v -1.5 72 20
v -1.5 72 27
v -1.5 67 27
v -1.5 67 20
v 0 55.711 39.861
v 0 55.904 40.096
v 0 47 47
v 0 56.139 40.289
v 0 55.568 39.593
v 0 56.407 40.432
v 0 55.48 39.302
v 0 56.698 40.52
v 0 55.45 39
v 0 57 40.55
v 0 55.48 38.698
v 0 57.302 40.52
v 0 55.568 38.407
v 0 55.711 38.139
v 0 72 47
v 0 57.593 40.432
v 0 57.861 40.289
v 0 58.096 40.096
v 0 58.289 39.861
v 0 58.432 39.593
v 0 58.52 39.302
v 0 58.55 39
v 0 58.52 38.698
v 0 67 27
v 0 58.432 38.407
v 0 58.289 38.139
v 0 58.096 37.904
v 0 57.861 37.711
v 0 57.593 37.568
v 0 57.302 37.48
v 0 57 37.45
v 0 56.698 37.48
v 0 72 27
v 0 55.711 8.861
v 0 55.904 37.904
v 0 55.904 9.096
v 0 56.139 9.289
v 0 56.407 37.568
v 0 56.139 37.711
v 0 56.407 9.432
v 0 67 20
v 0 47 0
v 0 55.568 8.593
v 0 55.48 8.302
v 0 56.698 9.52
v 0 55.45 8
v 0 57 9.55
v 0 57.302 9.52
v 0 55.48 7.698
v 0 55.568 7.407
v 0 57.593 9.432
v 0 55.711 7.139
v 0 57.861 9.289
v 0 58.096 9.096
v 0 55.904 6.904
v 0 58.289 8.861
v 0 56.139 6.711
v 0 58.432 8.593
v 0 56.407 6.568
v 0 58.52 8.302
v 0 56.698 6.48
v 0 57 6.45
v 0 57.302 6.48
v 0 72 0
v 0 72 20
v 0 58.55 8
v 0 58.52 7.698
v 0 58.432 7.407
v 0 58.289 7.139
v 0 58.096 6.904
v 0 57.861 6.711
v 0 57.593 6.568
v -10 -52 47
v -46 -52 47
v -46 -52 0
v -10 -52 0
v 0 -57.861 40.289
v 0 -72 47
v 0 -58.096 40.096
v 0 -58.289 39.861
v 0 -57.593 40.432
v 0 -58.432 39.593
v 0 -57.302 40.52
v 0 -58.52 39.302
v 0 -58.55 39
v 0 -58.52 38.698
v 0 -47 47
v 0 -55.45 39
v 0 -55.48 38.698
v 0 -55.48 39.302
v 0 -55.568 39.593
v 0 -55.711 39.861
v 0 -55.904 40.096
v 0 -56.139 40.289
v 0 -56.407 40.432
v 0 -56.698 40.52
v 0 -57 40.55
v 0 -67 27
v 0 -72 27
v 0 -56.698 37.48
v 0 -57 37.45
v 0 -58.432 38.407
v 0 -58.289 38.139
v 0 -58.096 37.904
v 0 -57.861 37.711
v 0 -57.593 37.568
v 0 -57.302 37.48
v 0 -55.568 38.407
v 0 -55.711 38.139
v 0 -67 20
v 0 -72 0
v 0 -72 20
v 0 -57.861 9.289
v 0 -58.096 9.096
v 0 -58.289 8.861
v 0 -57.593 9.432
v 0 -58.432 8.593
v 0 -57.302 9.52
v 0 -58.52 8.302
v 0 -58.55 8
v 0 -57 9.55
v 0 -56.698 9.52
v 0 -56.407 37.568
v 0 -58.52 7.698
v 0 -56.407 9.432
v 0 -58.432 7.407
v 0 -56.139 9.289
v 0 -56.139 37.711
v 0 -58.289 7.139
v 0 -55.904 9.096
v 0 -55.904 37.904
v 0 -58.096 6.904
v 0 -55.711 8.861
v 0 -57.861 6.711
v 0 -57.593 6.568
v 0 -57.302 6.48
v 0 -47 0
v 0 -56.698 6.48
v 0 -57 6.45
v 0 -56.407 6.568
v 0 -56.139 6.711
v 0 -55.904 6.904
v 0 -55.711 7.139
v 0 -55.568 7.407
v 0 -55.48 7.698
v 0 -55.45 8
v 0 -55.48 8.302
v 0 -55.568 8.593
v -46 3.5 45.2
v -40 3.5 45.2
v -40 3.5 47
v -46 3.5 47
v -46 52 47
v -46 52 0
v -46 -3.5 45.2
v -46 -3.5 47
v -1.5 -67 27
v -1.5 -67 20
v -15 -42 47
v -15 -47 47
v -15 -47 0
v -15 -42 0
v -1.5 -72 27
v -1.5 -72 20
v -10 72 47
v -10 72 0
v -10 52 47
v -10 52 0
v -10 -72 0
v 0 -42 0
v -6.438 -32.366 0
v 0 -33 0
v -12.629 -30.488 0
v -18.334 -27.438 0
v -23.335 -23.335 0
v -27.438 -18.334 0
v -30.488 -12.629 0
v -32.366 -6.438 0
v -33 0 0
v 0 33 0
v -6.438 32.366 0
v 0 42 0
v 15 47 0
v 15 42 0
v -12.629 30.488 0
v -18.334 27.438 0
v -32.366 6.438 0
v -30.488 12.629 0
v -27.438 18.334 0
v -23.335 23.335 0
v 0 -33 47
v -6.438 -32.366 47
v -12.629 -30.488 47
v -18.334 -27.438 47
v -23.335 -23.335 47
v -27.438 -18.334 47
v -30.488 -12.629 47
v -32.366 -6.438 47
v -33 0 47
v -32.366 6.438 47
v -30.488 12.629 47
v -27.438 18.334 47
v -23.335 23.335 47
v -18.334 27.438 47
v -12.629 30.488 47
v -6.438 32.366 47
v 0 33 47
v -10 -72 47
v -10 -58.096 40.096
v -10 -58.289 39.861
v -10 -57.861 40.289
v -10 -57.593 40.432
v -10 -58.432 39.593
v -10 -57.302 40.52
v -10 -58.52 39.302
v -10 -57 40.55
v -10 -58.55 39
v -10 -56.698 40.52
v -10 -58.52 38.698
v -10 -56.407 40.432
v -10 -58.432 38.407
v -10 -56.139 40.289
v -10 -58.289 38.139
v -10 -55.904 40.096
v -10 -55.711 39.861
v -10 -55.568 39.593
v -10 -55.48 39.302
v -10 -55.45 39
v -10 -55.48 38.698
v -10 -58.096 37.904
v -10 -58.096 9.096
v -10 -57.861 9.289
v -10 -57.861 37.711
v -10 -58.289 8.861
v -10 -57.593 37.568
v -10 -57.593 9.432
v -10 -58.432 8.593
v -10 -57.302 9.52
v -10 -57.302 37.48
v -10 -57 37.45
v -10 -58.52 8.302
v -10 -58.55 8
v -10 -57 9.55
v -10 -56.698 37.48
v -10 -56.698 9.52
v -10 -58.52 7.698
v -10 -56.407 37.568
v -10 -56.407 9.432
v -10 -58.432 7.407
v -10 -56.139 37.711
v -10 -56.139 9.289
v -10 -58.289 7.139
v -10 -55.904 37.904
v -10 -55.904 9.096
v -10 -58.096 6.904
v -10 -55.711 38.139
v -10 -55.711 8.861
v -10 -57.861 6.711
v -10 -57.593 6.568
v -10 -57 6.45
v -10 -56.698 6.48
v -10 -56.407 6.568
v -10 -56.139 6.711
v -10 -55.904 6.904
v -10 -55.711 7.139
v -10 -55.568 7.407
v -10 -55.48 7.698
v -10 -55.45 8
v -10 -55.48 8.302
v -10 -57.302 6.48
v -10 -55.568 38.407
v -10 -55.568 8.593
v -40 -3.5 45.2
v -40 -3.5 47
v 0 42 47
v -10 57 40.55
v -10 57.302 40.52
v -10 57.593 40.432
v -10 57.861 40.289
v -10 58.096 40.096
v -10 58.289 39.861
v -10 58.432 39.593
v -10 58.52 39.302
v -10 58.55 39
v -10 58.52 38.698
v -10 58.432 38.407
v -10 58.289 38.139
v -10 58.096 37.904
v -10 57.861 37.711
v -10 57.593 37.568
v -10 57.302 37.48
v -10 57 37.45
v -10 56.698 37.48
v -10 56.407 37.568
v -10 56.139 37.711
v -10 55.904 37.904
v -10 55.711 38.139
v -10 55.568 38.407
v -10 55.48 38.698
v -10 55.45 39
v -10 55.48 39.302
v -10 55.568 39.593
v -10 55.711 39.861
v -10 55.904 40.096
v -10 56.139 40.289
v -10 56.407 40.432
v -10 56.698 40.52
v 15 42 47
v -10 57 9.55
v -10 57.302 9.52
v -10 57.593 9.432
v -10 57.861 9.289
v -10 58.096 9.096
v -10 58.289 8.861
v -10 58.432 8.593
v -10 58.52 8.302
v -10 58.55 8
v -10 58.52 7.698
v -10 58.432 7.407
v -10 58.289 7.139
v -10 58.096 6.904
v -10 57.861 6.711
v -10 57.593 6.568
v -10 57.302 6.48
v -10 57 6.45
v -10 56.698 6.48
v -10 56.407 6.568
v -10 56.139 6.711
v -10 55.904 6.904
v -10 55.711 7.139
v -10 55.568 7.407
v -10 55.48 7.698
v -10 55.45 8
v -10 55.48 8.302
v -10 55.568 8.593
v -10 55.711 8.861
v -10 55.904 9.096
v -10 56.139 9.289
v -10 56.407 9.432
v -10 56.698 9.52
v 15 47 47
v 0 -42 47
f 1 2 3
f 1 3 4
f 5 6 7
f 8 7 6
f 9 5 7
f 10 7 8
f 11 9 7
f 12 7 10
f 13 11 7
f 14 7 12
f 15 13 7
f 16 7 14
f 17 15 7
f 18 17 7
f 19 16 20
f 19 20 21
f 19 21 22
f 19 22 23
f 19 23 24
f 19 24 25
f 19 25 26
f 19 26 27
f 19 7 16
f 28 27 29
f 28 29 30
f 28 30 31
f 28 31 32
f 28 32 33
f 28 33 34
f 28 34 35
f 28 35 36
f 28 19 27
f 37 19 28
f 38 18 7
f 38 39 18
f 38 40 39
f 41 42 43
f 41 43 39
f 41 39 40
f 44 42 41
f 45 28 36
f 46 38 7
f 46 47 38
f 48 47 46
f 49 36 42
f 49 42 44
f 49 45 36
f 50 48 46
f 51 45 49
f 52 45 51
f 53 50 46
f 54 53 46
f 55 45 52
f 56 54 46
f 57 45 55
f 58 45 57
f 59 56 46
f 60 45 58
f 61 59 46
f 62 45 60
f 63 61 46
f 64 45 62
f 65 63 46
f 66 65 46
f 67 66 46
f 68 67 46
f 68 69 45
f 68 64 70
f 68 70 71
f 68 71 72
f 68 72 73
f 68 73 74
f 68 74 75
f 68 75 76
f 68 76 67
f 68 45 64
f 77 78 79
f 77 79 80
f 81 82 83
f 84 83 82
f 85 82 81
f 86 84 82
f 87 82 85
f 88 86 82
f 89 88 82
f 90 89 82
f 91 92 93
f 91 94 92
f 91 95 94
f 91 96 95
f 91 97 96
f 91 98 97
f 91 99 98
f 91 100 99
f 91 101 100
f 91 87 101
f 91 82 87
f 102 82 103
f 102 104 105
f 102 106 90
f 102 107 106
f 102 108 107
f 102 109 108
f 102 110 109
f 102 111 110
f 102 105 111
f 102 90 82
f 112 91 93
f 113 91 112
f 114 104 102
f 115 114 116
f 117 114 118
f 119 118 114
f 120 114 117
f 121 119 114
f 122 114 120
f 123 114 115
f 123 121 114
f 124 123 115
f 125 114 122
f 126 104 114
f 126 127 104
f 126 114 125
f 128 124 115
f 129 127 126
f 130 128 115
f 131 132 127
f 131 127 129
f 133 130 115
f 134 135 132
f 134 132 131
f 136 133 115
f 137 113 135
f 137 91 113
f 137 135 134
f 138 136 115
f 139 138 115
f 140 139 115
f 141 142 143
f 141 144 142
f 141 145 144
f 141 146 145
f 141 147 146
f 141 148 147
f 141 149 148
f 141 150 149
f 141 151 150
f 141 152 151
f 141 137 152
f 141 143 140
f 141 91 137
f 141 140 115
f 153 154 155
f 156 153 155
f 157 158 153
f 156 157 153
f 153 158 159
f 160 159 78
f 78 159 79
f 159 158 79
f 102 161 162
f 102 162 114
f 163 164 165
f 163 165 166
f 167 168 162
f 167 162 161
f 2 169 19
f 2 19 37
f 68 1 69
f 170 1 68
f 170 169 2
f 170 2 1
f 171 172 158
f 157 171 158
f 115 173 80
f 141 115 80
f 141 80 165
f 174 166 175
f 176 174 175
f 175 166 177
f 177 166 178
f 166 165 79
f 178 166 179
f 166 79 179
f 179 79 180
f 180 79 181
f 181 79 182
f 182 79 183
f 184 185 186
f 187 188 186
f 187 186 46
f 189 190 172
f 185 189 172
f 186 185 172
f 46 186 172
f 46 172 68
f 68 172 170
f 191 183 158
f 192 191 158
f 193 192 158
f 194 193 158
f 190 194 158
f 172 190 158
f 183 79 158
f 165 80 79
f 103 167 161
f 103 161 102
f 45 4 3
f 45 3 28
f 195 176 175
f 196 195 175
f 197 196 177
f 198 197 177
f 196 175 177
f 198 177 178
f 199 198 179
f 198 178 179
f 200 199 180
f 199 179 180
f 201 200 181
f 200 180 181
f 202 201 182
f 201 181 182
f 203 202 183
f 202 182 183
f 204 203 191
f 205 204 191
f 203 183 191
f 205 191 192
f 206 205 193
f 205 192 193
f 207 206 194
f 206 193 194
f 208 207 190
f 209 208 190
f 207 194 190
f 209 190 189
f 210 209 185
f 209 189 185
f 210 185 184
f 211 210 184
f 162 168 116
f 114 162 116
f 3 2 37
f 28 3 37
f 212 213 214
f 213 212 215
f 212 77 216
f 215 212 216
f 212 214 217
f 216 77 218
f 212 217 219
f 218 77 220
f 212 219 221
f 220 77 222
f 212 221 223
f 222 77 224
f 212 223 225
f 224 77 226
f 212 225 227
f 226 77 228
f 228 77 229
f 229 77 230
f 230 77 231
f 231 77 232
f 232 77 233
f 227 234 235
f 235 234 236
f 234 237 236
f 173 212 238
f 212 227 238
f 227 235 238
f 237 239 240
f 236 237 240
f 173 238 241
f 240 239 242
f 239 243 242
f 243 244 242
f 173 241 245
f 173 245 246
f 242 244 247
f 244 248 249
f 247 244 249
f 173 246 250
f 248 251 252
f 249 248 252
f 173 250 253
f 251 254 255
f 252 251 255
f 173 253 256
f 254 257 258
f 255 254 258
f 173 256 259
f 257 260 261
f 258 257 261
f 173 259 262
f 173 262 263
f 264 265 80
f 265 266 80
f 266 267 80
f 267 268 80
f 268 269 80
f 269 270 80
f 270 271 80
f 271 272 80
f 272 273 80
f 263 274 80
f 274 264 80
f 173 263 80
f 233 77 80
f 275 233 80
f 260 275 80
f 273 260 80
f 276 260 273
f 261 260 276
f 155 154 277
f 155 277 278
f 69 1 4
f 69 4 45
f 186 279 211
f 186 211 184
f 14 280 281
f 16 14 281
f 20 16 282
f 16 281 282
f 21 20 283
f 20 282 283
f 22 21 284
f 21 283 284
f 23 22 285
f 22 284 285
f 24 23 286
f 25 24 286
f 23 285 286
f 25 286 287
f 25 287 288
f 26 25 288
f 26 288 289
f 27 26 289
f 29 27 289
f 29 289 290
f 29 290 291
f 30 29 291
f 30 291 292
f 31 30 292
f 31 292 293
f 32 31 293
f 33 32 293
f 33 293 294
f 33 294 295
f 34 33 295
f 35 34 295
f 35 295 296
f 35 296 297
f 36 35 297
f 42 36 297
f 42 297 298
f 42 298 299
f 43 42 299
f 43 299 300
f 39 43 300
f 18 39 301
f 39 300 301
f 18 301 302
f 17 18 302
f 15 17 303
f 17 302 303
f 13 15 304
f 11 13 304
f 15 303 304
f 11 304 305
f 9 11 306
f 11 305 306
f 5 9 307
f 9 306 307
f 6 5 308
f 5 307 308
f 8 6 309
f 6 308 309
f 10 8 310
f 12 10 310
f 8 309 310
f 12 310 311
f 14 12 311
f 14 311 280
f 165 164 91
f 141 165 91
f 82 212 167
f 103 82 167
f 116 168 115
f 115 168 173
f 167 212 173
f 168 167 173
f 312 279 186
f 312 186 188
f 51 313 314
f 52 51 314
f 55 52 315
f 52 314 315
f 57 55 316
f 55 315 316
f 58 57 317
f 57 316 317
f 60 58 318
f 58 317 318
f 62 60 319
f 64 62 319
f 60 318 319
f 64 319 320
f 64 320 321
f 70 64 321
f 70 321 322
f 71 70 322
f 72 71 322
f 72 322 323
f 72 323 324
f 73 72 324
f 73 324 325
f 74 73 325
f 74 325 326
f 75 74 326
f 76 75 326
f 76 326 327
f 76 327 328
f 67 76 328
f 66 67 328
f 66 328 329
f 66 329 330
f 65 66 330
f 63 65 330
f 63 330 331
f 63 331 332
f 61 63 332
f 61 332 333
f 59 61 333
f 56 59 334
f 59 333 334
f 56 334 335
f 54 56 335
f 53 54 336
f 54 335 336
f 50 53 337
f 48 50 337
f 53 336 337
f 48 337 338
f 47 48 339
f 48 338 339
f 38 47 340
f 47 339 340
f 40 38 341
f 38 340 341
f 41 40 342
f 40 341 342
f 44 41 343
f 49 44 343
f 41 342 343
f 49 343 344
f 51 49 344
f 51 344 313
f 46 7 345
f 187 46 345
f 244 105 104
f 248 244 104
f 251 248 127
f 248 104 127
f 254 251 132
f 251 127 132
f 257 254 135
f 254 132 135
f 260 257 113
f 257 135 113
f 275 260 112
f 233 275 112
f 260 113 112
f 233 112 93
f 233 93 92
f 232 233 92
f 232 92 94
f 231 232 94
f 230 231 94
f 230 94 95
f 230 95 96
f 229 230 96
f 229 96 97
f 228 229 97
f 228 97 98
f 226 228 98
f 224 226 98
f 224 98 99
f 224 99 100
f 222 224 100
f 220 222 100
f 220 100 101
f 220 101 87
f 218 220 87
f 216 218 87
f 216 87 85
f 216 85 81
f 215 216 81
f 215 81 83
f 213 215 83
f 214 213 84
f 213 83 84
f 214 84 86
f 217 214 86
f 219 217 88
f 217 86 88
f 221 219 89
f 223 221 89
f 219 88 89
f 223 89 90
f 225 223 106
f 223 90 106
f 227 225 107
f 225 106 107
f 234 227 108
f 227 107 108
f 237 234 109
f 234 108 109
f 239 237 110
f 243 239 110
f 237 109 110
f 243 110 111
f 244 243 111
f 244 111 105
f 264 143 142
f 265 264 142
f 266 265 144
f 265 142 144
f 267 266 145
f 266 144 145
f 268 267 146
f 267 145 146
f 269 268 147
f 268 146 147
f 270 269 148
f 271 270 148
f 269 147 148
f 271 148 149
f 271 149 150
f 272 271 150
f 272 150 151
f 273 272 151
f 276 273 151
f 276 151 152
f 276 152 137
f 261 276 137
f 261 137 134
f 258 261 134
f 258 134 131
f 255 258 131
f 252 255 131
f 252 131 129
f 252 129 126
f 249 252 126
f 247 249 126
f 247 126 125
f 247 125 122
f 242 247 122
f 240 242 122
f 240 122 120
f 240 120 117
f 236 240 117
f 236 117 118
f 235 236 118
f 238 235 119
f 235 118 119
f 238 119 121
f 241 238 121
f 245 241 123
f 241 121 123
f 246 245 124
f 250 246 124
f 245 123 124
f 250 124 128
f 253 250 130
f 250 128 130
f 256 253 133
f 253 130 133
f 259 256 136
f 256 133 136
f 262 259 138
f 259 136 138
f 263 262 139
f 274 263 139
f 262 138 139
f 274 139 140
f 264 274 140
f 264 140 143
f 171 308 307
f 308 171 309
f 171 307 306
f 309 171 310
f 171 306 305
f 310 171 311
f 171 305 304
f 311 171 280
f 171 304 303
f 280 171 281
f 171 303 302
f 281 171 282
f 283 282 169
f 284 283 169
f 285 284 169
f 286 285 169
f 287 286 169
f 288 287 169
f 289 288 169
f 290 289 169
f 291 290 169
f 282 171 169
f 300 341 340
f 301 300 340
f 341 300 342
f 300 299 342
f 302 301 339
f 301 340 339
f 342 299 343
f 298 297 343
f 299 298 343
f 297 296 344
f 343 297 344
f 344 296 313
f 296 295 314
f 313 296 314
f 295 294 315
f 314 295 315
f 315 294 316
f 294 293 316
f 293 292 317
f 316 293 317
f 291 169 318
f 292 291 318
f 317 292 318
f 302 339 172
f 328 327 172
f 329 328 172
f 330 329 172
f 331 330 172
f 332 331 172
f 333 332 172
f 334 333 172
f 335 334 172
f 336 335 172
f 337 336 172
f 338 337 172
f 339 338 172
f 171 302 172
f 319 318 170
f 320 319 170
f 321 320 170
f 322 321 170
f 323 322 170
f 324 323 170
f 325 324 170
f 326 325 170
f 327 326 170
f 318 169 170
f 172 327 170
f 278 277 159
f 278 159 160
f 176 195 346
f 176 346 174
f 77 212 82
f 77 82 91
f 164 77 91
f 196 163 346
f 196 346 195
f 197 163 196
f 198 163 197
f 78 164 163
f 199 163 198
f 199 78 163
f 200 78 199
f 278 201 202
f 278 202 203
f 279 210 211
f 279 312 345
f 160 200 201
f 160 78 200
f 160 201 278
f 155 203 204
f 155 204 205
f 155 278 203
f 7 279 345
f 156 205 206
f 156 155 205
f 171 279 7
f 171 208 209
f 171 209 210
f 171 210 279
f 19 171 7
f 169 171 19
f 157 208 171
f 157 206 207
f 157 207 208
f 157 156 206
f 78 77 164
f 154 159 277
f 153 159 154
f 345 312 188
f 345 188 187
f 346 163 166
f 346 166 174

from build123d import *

# Parameters (mm, degrees)
EXTRUDE_1_DEPTH     = 47
SKETCH_2_W          = 47
SKETCH_2_H          = 20
EXTRUDE_2_DEPTH     = 10
SKETCH_5_W          = 47
SKETCH_5_H          = 20
EXTRUDE_5_DEPTH     = 10
SKETCH_6_W          = 15
SKETCH_6_H          = 5
CUT_EXTRUDE_1_DEPTH = 98.514101544
SKETCH_7_W          = 15
SKETCH_7_H          = 5
EXTRUDE_6_DEPTH     = 47
SKETCH_8_W          = 1.5
SKETCH_8_H          = 7
CUT_EXTRUDE_2_DEPTH = 5
SKETCH_10_R         = 1.55
CUT_EXTRUDE_4_DEPTH = 98.514101544
SKETCH_12_R         = 1.55
CUT_EXTRUDE_5_DEPTH = 94.214805691
SKETCH_13_W         = 1.5
SKETCH_13_H         = 7
CUT_EXTRUDE_6_DEPTH = 5
SKETCH_14_W         = 1.8
SKETCH_14_H         = 7
CUT_EXTRUDE_7_DEPTH = 6


with BuildPart() as part:
    # 草图1 → 凸台-拉伸1 (new body)
    with BuildSketch(Plane.XY):
        with BuildLine():
            Line((0, 33), (0, 52))
            Line((0, 52), (-46, 52))
            Line((-46, 52), (-46, -52))
            Line((-46, -52), (0, -52))
            Line((0, -52), (0, -33))
            ThreePointArc((0, -33), (-33, 0), (0, 33))
        make_face()
    extrude(amount=EXTRUDE_1_DEPTH)

    # 草图2 → 凸台-拉伸2 (add)
    with BuildSketch(Plane(origin=(-10, 0, 0), x_dir=(0, 0, -1), z_dir=(1, 0, 0))):
        with Locations((-23.5, 62)):
            Rectangle(SKETCH_2_W, SKETCH_2_H)
    extrude(amount=EXTRUDE_2_DEPTH)

    # 草图5 → 凸台-拉伸5 (add)
    with BuildSketch(Plane(origin=(-10, 0, 0), x_dir=(0, 0, -1), z_dir=(1, 0, 0))):
        with Locations((-23.5, -62)):
            Rectangle(SKETCH_5_W, SKETCH_5_H)
    extrude(amount=EXTRUDE_5_DEPTH)

    # 草图6 → 切除-拉伸1 (cut, through all)
    with BuildSketch(Plane.XY.offset(47)):
        with Locations((-7.5, -44.5)):
            Rectangle(SKETCH_6_W, SKETCH_6_H)
    extrude(amount=-CUT_EXTRUDE_1_DEPTH, mode=Mode.SUBTRACT)

    # 草图7 → 凸台-拉伸6 (add, through all)
    with BuildSketch(Plane.XY.offset(47)):
        with Locations((7.5, 44.5)):
            Rectangle(SKETCH_7_W, SKETCH_7_H)
    extrude(amount=-EXTRUDE_6_DEPTH)

    # 草图8 → 切除-拉伸2 (cut)
    with BuildSketch(Plane.XZ.offset(72)):
        with Locations((-0.75, 23.5)):
            Rectangle(SKETCH_8_W, SKETCH_8_H)
    extrude(amount=-CUT_EXTRUDE_2_DEPTH, mode=Mode.SUBTRACT)

    # 草图10 → 切除-拉伸4 (cut, through all)
    with BuildSketch(Plane(origin=(0, 0, 0), x_dir=(0, 0, -1), z_dir=(1, 0, 0))):
        with Locations((-39, -57)):
            Circle(SKETCH_10_R)
        with Locations((-8, -57)):
            Circle(SKETCH_10_R)
    extrude(amount=-CUT_EXTRUDE_4_DEPTH, mode=Mode.SUBTRACT)

    # 草图12 → 切除-拉伸5 (cut, through all)
    with BuildSketch(Plane.ZY.offset(10)):
        with Locations((8, 57)):
            Circle(SKETCH_12_R)
        with Locations((39, 57)):
            Circle(SKETCH_12_R)
    extrude(amount=-CUT_EXTRUDE_5_DEPTH, mode=Mode.SUBTRACT)

    # 草图13 → 切除-拉伸6 (cut)
    with BuildSketch(Plane(origin=(0, 72, 0), x_dir=(1, 0, 0), z_dir=(0, 1, 0))):
        with Locations((-0.75, -23.5)):
            Rectangle(SKETCH_13_W, SKETCH_13_H)
    extrude(amount=-CUT_EXTRUDE_6_DEPTH, mode=Mode.SUBTRACT)

    # 草图14 → 切除-拉伸7 (cut)
    with BuildSketch(Plane.ZY.offset(46)):
        with Locations((46.1, 0)):
            Rectangle(SKETCH_14_W, SKETCH_14_H)
    extrude(amount=-CUT_EXTRUDE_7_DEPTH, mode=Mode.SUBTRACT)


solid = part.part
